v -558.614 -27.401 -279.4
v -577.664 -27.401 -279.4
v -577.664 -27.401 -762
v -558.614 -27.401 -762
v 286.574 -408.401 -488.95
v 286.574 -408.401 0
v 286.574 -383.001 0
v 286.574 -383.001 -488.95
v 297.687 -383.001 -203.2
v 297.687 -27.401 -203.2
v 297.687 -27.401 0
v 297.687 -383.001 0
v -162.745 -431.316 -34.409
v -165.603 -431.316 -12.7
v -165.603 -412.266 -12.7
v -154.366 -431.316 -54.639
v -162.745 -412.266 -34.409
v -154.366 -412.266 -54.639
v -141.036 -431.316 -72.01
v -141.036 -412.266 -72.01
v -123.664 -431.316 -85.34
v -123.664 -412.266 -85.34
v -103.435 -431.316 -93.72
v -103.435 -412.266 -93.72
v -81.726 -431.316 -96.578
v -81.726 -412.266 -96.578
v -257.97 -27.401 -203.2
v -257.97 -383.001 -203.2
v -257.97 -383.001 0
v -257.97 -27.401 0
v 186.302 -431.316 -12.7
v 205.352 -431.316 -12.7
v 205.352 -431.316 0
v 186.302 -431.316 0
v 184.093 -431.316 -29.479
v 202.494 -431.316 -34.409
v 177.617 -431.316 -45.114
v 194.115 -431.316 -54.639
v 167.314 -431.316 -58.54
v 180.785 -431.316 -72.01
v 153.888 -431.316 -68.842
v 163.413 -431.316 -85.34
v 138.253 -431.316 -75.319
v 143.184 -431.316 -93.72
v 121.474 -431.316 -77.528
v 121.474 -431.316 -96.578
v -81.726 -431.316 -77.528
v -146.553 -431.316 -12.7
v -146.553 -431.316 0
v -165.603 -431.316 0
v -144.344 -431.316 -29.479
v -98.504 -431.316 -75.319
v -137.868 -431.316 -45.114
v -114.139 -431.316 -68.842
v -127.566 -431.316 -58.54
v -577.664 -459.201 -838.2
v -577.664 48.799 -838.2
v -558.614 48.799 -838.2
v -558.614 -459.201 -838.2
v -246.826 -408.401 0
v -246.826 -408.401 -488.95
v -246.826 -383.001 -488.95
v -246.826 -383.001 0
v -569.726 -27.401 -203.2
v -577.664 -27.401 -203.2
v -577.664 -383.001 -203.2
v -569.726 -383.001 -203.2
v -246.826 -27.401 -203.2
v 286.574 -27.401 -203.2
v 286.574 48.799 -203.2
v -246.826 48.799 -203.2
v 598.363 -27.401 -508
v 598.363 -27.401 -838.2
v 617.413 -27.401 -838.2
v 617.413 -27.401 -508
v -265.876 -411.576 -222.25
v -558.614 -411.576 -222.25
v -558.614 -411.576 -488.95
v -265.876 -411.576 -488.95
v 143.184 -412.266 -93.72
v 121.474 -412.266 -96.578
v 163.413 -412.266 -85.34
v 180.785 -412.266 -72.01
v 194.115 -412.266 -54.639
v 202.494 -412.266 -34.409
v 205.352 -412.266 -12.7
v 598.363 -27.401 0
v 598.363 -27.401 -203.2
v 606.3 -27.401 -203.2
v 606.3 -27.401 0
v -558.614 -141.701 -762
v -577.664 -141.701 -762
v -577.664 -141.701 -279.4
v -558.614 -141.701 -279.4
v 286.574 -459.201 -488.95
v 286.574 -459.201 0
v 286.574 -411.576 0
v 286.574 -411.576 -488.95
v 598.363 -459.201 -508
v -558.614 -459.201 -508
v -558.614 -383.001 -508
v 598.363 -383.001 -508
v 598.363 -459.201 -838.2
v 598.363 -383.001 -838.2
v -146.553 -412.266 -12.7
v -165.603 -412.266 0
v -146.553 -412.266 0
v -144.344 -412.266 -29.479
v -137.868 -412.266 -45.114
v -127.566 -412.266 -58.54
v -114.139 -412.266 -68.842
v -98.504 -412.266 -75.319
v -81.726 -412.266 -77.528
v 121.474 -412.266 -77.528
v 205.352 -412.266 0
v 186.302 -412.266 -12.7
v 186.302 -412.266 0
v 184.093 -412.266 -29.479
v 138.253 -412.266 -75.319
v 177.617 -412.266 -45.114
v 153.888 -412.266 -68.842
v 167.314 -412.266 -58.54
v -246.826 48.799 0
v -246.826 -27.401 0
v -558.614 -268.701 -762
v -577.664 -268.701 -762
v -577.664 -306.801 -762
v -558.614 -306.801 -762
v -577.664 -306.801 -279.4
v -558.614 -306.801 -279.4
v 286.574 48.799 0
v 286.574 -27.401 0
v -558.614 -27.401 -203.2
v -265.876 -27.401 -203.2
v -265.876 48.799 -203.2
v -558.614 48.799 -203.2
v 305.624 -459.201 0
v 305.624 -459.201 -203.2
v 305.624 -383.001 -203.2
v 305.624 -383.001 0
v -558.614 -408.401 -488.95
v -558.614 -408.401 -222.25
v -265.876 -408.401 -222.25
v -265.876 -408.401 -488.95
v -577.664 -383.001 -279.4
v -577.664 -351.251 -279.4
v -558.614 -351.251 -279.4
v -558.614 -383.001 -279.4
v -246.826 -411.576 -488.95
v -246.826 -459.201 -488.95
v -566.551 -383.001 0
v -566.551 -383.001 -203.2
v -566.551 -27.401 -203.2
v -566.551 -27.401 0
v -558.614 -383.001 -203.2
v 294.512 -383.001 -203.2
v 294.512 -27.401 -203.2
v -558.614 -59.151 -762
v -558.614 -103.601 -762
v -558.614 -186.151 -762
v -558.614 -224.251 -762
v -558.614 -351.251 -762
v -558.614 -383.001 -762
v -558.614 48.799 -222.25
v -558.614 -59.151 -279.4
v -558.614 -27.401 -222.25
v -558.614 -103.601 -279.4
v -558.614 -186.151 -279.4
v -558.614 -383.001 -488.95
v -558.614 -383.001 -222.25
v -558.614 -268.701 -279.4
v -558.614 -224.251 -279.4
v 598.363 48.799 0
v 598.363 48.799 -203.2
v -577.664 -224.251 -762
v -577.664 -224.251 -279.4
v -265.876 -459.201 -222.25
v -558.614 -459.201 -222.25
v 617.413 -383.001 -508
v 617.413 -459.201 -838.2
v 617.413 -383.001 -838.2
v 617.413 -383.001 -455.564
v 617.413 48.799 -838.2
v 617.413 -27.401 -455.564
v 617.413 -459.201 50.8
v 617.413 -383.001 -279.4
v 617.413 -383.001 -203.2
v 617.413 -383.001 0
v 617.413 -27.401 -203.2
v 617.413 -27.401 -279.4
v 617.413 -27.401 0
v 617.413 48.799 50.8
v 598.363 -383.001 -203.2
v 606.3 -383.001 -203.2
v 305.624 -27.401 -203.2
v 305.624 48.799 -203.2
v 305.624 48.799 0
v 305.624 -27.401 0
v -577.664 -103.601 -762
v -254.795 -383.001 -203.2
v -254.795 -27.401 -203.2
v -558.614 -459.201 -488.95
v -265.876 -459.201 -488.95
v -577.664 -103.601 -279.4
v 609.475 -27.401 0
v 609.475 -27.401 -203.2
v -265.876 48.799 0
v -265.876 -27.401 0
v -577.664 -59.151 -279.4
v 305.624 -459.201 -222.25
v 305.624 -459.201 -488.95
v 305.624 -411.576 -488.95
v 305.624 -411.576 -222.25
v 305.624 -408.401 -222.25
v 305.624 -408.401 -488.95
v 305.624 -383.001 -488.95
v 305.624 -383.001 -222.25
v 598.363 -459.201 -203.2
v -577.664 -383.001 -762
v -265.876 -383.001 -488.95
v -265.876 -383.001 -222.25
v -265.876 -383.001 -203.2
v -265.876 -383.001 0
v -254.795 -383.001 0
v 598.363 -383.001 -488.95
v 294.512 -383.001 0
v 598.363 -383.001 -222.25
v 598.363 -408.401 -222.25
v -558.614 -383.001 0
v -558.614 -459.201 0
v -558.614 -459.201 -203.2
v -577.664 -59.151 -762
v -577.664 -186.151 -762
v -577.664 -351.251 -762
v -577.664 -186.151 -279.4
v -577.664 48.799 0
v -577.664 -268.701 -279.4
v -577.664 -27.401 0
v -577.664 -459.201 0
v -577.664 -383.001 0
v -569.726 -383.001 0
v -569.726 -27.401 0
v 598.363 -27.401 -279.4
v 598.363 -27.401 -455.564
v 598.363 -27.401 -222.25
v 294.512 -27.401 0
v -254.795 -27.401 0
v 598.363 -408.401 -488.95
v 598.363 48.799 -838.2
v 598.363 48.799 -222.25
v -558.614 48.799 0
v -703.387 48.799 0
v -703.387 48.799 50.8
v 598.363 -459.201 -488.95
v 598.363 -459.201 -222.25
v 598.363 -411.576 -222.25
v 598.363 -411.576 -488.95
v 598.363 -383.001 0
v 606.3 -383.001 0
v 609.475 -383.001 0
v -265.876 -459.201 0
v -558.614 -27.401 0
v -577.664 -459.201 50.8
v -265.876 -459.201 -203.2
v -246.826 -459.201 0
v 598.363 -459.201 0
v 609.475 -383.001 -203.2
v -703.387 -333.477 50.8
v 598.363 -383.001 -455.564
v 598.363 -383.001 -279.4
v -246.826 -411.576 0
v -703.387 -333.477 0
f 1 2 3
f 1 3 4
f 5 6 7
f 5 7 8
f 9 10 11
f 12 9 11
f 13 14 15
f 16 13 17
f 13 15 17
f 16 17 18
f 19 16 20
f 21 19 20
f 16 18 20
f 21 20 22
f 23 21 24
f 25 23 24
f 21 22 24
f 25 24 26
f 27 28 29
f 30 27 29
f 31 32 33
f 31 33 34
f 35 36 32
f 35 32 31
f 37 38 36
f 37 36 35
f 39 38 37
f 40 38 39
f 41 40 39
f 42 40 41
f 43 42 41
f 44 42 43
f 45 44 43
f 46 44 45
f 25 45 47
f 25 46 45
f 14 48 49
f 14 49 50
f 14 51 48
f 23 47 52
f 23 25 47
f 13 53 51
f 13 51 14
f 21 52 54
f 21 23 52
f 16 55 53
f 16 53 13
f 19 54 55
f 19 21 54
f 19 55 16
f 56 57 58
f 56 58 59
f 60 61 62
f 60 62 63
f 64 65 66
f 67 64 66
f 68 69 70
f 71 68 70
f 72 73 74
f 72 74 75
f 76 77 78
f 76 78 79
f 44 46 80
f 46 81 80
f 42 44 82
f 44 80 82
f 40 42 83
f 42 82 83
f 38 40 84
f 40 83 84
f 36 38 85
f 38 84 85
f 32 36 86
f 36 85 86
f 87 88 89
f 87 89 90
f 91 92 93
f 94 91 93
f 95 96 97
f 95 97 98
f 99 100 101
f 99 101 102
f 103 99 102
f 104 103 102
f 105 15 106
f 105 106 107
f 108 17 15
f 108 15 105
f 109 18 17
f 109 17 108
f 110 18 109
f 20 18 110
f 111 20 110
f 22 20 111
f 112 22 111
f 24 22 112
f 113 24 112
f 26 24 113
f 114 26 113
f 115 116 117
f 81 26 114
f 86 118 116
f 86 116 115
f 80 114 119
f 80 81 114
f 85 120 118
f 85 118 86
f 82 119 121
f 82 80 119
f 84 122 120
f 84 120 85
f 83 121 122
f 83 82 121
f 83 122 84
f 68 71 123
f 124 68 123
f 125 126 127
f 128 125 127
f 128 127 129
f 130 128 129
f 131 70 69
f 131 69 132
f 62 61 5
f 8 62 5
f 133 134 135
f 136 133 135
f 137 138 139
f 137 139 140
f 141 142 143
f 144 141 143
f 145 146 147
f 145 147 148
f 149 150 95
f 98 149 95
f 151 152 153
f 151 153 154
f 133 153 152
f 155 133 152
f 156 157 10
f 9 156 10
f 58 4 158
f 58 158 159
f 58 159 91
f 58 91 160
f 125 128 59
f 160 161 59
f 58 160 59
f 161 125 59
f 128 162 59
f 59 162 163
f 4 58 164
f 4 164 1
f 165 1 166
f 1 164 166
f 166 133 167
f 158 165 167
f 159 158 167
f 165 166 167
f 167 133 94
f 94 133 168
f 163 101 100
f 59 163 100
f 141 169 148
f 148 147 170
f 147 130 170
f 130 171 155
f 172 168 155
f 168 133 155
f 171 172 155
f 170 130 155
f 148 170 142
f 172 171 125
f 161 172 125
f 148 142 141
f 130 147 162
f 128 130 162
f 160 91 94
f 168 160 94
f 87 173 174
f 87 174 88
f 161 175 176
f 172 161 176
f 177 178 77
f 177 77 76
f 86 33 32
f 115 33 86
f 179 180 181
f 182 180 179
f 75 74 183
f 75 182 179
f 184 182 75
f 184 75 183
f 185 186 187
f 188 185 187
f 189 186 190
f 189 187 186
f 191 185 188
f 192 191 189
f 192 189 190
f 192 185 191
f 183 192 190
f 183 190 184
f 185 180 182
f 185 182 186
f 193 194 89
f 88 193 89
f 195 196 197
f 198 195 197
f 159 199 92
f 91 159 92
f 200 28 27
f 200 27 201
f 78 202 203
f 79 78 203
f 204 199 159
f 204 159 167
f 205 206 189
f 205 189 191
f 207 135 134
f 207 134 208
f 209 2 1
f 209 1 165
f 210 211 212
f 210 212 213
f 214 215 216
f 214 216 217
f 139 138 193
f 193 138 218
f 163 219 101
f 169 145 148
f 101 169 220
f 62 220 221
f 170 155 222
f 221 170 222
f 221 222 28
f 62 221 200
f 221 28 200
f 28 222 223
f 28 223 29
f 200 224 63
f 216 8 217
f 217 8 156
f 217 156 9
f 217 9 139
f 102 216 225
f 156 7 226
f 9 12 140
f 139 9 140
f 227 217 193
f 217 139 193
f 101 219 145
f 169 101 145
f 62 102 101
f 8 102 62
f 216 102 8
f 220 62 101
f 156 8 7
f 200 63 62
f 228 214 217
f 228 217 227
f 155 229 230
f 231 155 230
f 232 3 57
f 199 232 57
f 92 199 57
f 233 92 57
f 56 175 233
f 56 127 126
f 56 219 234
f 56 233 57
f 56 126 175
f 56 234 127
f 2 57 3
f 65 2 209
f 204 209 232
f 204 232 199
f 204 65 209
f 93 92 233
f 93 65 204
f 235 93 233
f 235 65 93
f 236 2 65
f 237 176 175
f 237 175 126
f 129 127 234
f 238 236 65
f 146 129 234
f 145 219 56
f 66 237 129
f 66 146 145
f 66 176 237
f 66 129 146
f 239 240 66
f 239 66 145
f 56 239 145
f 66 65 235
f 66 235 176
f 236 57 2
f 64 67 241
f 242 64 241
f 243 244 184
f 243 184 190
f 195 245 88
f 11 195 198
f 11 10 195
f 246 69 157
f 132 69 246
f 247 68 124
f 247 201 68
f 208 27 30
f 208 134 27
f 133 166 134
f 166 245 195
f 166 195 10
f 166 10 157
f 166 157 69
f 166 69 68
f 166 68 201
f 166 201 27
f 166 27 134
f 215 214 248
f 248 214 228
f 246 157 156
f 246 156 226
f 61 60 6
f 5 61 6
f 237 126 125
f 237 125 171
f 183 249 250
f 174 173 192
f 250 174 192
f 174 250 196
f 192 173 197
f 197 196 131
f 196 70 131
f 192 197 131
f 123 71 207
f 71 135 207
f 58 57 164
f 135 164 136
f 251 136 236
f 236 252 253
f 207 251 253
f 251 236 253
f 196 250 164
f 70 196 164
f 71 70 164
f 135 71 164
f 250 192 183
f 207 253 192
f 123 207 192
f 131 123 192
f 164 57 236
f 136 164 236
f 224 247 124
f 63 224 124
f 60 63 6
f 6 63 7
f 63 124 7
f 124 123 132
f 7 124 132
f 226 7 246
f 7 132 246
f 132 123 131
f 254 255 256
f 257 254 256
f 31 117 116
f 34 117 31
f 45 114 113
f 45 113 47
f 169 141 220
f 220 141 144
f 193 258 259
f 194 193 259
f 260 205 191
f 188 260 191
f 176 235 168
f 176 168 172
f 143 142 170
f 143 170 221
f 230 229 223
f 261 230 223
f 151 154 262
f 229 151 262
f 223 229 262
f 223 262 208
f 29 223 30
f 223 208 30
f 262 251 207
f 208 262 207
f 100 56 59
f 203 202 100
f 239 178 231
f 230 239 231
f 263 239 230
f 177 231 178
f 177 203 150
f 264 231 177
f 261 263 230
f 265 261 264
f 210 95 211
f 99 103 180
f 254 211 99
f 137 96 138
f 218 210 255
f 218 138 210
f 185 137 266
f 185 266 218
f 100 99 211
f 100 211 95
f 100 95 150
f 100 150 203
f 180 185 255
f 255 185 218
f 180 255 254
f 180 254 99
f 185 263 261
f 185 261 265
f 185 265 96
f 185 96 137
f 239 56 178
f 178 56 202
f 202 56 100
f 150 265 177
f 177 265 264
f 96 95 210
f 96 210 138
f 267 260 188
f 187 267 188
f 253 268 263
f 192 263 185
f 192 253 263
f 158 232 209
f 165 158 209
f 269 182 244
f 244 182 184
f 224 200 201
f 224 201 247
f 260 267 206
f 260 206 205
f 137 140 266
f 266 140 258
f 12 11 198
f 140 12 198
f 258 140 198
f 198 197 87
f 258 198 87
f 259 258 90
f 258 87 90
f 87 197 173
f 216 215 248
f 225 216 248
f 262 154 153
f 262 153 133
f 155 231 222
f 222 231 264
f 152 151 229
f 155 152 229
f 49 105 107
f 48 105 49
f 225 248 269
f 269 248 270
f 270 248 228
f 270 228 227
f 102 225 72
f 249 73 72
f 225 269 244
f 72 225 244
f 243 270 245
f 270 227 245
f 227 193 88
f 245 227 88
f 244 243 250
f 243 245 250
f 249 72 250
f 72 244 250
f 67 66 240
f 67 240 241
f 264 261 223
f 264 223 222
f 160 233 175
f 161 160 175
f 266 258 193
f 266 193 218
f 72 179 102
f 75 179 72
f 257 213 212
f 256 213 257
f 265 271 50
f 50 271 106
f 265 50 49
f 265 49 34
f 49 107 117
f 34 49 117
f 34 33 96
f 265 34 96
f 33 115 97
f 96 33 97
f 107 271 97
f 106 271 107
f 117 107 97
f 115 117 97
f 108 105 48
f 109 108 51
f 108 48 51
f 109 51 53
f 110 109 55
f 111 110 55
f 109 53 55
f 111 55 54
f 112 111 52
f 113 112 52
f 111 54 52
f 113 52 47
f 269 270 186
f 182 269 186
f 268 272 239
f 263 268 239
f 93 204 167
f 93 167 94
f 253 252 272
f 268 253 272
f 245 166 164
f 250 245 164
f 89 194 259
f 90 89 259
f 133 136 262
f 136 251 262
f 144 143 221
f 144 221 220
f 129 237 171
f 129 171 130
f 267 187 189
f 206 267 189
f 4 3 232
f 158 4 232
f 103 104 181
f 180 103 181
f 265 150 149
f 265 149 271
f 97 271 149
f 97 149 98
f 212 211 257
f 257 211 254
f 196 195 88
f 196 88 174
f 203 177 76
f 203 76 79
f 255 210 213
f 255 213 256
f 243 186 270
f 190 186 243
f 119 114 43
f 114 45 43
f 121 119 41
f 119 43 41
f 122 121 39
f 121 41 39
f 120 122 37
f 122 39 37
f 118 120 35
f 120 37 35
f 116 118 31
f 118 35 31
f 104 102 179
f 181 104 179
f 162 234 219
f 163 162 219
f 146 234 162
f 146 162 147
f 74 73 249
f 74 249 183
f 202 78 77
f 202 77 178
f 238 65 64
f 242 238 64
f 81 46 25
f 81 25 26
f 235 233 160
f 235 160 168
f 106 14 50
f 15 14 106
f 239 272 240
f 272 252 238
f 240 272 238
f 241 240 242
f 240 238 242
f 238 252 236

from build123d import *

# Parameters (mm, degrees)
F1_DEPTH  = 50.8
F2_W      = 19.05
F2_H      = 76.2
F3_DEPTH  = 838.2
F4_W      = 355.6
F4_H      = 76.2
F5_DEPTH  = 19.05
F6_W      = 44.45
F6_H      = 482.6
F7_DEPTH  = 19.05
F9_W      = 76.2
F9_H      = 19.05
F10_DEPTH = 1156.976414305
F8_W      = 292.7382071525
F8_H      = 19.05
F11_DEPTH = 76.2
F12_W     = 19.05
F12_H     = 203.2
F13_DEPTH = 76.2
F14_W     = 3.175
F14_H     = 203.2
F15_DEPTH = 431.8
F16_W     = 355.6
F16_H     = 76.2
F16_H_2   = 52.435785675
F17_DEPTH = 19.05
F20_W     = 19.05
F20_H     = 19.05
F22_W     = 533.4
F22_H     = 19.05
F22_W_2   = 292.7382071525
F23_DEPTH = 76.2
F25_DEPTH = 3.175


with BuildPart() as f1:
    # F0 (on Top) → F1 (new body)
    with BuildSketch(Plane.XY):
        Polygon((617.4126458168, 48.7991196131), (-703.3873541832, 48.7991196131), (-703.3873541832, -333.4772946919), (-577.6637684882, -459.2008803869), (617.4126458168, -459.2008803869), align=None)
    extrude(amount=F1_DEPTH)

    # F2 (on face) → F3 (join)
    with BuildSketch(Plane(origin=(0, 0, 0), x_dir=(1, 0, 0), z_dir=(0, 0, -1))):
        with Locations((607.8876458168, 421.1008803869)):
            Rectangle(F2_W, F2_H)
        with Locations((607.8876458168, -10.6991196131)):
            Rectangle(F2_W, F2_H)
        with Locations((-568.1387684882, 421.1008803869)):
            Rectangle(F2_W, F2_H)
        with Locations((-568.1387684882, -10.6991196131)):
            Rectangle(F2_W, F2_H)
    extrude(amount=F3_DEPTH)

    # F4 (on face) → F5 (join)
    with BuildSketch(Plane(origin=(-577.6637684882, 0, 0), x_dir=(0, -1, 0), z_dir=(-1, 0, 0))):
        with Locations((205.2008803869, -241.3)):
            Rectangle(F4_W, F4_H)
        with Locations((205.2008803869, -800.1)):
            Rectangle(F4_W, F4_H)
    extrude(amount=-F5_DEPTH)

    # F6 (on face) → F7 (join, through all)
    with BuildSketch(Plane(origin=(-577.6637684882, 0, 0), x_dir=(0, -1, 0), z_dir=(-1, 0, 0))):
        with Locations((81.3758803869, -520.7)):
            Rectangle(F6_W, F6_H)
        with Locations((163.9258803869, -520.7)):
            Rectangle(F6_W, F6_H)
        with Locations((246.4758803869, -520.7)):
            Rectangle(F6_W, F6_H)
        with Locations((329.0258803869, -520.7)):
            Rectangle(F6_W, F6_H)
    extrude(amount=-F7_DEPTH)

    # F9 (on face) → F10 (join, through all)
    with BuildSketch(Plane.YZ.offset(-558.6137684882)):
        with Locations((10.6991196131, -212.725)):
            Rectangle(F9_W, F9_H)
    extrude(amount=F10_DEPTH)

    # F8 (on face) → F11 (join)
    with BuildSketch(Plane.XZ.offset(459.2008803869)):
        Polygon((-246.8255613357, 0), (-265.8755613357, 0), (-265.8755613357, -203.2), (-265.8755613357, -222.25), (-246.8255613357, -222.25), align=None)
        with Locations((-412.244664912, -212.725)):
            Rectangle(F8_W, F8_H)
        Polygon((305.6244386643, 0), (286.5744386643, 0), (286.5744386643, -222.25), (305.6244386643, -222.25), (305.6244386643, -203.2), align=None)
        with Locations((451.9935422405, -212.725)):
            Rectangle(F8_W, F8_H)
    extrude(amount=-F11_DEPTH)

    # F12 (on face) → F13 (join)
    with BuildSketch(Plane(origin=(0, 48.7991196131, 0), x_dir=(-1, 0, 0), z_dir=(0, 1, 0))):
        with Locations((-296.0994386643, -101.6)):
            Rectangle(F12_W, F12_H)
        with Locations((256.3505613357, -101.6)):
            Rectangle(F12_W, F12_H)
    extrude(amount=-F13_DEPTH)

    # F14 (on face) → F15 (join, through all)
    with BuildSketch(Plane.XZ.offset(459.2008803869)):
        with Locations((-568.1387684882, -101.6)):
            Rectangle(F14_W, F14_H)
        with Locations((-256.3823113357, -101.6)):
            Rectangle(F14_W, F14_H)
        with Locations((296.0994386643, -101.6)):
            Rectangle(F14_W, F14_H)
        with Locations((607.8876458168, -101.6)):
            Rectangle(F14_W, F14_H)
    extrude(amount=-F15_DEPTH)

    # F16 (on face) → F17 (join)
    with BuildSketch(Plane.YZ.offset(617.4126458168)):
        with Locations((-205.2008803869, -241.3)):
            Rectangle(F16_W, F16_H)
        with Locations((-205.2008803869, -481.7821071625)):
            Rectangle(F16_W, F16_H_2)
    extrude(amount=-F17_DEPTH)

    # F21: sweep along a path in F19
    with BuildLine(Plane.XZ.offset(408.4008803869)) as f21_path:
        Line((-145.2255613357, 0), (-145.2255613357, -12.7))
        ThreePointArc((-145.2255613357, -12.7), (-126.6268419411, -57.6012806053), (-81.7255613357, -76.2))
        Line((-81.7255613357, -76.2), (121.4744386643, -76.2))
        ThreePointArc((121.4744386643, -76.2), (166.3757192696, -57.6012806053), (184.9744386643, -12.7))
        Line((184.9744386643, -12.7), (184.9744386643, 0))
    # F20 (on face) → F21 (sweep)
    with BuildSketch(Plane(origin=(0, 0, 0), x_dir=(1, 0, 0), z_dir=(0, 0, -1))):
        with Locations((-156.0781598091, 421.7912954004)):
            Rectangle(F20_W, F20_H)
    sweep(path=f21_path.line)

    # F22 (on face) → F23 (join)
    with BuildSketch(Plane.XZ.offset(459.2008803869)):
        Polygon((-246.8255613357, -488.95), (-246.8255613357, -222.25), (-265.8755613357, -222.25), (-265.8755613357, -488.95), (-265.8755613357, -508), (-246.8255613357, -508), align=None)
        with Locations((19.8744386643, -498.475)):
            Rectangle(F22_W, F22_H)
        with Locations((-412.244664912, -498.475)):
            Rectangle(F22_W_2, F22_H)
        Polygon((286.5744386643, -222.25), (286.5744386643, -488.95), (286.5744386643, -508), (305.6244386643, -508), (305.6244386643, -488.95), (305.6244386643, -222.25), align=None)
        with Locations((451.9935422405, -498.475)):
            Rectangle(F22_W_2, F22_H)
    extrude(amount=-F23_DEPTH)

    # F24 (on offset) → F25 (join)
    with BuildSketch(Plane.XZ.offset(408.4008803869)):
        Polygon((-558.6137684882, -222.25), (-558.6137684882, -488.95), (598.3626458168, -488.95), (598.3626458168, -222.25), (286.5744386643, -222.25), (286.5744386643, 0), (-246.8255613357, 0), (-246.8255613357, -222.25), align=None)
    extrude(amount=F25_DEPTH)


solid = f1.part
